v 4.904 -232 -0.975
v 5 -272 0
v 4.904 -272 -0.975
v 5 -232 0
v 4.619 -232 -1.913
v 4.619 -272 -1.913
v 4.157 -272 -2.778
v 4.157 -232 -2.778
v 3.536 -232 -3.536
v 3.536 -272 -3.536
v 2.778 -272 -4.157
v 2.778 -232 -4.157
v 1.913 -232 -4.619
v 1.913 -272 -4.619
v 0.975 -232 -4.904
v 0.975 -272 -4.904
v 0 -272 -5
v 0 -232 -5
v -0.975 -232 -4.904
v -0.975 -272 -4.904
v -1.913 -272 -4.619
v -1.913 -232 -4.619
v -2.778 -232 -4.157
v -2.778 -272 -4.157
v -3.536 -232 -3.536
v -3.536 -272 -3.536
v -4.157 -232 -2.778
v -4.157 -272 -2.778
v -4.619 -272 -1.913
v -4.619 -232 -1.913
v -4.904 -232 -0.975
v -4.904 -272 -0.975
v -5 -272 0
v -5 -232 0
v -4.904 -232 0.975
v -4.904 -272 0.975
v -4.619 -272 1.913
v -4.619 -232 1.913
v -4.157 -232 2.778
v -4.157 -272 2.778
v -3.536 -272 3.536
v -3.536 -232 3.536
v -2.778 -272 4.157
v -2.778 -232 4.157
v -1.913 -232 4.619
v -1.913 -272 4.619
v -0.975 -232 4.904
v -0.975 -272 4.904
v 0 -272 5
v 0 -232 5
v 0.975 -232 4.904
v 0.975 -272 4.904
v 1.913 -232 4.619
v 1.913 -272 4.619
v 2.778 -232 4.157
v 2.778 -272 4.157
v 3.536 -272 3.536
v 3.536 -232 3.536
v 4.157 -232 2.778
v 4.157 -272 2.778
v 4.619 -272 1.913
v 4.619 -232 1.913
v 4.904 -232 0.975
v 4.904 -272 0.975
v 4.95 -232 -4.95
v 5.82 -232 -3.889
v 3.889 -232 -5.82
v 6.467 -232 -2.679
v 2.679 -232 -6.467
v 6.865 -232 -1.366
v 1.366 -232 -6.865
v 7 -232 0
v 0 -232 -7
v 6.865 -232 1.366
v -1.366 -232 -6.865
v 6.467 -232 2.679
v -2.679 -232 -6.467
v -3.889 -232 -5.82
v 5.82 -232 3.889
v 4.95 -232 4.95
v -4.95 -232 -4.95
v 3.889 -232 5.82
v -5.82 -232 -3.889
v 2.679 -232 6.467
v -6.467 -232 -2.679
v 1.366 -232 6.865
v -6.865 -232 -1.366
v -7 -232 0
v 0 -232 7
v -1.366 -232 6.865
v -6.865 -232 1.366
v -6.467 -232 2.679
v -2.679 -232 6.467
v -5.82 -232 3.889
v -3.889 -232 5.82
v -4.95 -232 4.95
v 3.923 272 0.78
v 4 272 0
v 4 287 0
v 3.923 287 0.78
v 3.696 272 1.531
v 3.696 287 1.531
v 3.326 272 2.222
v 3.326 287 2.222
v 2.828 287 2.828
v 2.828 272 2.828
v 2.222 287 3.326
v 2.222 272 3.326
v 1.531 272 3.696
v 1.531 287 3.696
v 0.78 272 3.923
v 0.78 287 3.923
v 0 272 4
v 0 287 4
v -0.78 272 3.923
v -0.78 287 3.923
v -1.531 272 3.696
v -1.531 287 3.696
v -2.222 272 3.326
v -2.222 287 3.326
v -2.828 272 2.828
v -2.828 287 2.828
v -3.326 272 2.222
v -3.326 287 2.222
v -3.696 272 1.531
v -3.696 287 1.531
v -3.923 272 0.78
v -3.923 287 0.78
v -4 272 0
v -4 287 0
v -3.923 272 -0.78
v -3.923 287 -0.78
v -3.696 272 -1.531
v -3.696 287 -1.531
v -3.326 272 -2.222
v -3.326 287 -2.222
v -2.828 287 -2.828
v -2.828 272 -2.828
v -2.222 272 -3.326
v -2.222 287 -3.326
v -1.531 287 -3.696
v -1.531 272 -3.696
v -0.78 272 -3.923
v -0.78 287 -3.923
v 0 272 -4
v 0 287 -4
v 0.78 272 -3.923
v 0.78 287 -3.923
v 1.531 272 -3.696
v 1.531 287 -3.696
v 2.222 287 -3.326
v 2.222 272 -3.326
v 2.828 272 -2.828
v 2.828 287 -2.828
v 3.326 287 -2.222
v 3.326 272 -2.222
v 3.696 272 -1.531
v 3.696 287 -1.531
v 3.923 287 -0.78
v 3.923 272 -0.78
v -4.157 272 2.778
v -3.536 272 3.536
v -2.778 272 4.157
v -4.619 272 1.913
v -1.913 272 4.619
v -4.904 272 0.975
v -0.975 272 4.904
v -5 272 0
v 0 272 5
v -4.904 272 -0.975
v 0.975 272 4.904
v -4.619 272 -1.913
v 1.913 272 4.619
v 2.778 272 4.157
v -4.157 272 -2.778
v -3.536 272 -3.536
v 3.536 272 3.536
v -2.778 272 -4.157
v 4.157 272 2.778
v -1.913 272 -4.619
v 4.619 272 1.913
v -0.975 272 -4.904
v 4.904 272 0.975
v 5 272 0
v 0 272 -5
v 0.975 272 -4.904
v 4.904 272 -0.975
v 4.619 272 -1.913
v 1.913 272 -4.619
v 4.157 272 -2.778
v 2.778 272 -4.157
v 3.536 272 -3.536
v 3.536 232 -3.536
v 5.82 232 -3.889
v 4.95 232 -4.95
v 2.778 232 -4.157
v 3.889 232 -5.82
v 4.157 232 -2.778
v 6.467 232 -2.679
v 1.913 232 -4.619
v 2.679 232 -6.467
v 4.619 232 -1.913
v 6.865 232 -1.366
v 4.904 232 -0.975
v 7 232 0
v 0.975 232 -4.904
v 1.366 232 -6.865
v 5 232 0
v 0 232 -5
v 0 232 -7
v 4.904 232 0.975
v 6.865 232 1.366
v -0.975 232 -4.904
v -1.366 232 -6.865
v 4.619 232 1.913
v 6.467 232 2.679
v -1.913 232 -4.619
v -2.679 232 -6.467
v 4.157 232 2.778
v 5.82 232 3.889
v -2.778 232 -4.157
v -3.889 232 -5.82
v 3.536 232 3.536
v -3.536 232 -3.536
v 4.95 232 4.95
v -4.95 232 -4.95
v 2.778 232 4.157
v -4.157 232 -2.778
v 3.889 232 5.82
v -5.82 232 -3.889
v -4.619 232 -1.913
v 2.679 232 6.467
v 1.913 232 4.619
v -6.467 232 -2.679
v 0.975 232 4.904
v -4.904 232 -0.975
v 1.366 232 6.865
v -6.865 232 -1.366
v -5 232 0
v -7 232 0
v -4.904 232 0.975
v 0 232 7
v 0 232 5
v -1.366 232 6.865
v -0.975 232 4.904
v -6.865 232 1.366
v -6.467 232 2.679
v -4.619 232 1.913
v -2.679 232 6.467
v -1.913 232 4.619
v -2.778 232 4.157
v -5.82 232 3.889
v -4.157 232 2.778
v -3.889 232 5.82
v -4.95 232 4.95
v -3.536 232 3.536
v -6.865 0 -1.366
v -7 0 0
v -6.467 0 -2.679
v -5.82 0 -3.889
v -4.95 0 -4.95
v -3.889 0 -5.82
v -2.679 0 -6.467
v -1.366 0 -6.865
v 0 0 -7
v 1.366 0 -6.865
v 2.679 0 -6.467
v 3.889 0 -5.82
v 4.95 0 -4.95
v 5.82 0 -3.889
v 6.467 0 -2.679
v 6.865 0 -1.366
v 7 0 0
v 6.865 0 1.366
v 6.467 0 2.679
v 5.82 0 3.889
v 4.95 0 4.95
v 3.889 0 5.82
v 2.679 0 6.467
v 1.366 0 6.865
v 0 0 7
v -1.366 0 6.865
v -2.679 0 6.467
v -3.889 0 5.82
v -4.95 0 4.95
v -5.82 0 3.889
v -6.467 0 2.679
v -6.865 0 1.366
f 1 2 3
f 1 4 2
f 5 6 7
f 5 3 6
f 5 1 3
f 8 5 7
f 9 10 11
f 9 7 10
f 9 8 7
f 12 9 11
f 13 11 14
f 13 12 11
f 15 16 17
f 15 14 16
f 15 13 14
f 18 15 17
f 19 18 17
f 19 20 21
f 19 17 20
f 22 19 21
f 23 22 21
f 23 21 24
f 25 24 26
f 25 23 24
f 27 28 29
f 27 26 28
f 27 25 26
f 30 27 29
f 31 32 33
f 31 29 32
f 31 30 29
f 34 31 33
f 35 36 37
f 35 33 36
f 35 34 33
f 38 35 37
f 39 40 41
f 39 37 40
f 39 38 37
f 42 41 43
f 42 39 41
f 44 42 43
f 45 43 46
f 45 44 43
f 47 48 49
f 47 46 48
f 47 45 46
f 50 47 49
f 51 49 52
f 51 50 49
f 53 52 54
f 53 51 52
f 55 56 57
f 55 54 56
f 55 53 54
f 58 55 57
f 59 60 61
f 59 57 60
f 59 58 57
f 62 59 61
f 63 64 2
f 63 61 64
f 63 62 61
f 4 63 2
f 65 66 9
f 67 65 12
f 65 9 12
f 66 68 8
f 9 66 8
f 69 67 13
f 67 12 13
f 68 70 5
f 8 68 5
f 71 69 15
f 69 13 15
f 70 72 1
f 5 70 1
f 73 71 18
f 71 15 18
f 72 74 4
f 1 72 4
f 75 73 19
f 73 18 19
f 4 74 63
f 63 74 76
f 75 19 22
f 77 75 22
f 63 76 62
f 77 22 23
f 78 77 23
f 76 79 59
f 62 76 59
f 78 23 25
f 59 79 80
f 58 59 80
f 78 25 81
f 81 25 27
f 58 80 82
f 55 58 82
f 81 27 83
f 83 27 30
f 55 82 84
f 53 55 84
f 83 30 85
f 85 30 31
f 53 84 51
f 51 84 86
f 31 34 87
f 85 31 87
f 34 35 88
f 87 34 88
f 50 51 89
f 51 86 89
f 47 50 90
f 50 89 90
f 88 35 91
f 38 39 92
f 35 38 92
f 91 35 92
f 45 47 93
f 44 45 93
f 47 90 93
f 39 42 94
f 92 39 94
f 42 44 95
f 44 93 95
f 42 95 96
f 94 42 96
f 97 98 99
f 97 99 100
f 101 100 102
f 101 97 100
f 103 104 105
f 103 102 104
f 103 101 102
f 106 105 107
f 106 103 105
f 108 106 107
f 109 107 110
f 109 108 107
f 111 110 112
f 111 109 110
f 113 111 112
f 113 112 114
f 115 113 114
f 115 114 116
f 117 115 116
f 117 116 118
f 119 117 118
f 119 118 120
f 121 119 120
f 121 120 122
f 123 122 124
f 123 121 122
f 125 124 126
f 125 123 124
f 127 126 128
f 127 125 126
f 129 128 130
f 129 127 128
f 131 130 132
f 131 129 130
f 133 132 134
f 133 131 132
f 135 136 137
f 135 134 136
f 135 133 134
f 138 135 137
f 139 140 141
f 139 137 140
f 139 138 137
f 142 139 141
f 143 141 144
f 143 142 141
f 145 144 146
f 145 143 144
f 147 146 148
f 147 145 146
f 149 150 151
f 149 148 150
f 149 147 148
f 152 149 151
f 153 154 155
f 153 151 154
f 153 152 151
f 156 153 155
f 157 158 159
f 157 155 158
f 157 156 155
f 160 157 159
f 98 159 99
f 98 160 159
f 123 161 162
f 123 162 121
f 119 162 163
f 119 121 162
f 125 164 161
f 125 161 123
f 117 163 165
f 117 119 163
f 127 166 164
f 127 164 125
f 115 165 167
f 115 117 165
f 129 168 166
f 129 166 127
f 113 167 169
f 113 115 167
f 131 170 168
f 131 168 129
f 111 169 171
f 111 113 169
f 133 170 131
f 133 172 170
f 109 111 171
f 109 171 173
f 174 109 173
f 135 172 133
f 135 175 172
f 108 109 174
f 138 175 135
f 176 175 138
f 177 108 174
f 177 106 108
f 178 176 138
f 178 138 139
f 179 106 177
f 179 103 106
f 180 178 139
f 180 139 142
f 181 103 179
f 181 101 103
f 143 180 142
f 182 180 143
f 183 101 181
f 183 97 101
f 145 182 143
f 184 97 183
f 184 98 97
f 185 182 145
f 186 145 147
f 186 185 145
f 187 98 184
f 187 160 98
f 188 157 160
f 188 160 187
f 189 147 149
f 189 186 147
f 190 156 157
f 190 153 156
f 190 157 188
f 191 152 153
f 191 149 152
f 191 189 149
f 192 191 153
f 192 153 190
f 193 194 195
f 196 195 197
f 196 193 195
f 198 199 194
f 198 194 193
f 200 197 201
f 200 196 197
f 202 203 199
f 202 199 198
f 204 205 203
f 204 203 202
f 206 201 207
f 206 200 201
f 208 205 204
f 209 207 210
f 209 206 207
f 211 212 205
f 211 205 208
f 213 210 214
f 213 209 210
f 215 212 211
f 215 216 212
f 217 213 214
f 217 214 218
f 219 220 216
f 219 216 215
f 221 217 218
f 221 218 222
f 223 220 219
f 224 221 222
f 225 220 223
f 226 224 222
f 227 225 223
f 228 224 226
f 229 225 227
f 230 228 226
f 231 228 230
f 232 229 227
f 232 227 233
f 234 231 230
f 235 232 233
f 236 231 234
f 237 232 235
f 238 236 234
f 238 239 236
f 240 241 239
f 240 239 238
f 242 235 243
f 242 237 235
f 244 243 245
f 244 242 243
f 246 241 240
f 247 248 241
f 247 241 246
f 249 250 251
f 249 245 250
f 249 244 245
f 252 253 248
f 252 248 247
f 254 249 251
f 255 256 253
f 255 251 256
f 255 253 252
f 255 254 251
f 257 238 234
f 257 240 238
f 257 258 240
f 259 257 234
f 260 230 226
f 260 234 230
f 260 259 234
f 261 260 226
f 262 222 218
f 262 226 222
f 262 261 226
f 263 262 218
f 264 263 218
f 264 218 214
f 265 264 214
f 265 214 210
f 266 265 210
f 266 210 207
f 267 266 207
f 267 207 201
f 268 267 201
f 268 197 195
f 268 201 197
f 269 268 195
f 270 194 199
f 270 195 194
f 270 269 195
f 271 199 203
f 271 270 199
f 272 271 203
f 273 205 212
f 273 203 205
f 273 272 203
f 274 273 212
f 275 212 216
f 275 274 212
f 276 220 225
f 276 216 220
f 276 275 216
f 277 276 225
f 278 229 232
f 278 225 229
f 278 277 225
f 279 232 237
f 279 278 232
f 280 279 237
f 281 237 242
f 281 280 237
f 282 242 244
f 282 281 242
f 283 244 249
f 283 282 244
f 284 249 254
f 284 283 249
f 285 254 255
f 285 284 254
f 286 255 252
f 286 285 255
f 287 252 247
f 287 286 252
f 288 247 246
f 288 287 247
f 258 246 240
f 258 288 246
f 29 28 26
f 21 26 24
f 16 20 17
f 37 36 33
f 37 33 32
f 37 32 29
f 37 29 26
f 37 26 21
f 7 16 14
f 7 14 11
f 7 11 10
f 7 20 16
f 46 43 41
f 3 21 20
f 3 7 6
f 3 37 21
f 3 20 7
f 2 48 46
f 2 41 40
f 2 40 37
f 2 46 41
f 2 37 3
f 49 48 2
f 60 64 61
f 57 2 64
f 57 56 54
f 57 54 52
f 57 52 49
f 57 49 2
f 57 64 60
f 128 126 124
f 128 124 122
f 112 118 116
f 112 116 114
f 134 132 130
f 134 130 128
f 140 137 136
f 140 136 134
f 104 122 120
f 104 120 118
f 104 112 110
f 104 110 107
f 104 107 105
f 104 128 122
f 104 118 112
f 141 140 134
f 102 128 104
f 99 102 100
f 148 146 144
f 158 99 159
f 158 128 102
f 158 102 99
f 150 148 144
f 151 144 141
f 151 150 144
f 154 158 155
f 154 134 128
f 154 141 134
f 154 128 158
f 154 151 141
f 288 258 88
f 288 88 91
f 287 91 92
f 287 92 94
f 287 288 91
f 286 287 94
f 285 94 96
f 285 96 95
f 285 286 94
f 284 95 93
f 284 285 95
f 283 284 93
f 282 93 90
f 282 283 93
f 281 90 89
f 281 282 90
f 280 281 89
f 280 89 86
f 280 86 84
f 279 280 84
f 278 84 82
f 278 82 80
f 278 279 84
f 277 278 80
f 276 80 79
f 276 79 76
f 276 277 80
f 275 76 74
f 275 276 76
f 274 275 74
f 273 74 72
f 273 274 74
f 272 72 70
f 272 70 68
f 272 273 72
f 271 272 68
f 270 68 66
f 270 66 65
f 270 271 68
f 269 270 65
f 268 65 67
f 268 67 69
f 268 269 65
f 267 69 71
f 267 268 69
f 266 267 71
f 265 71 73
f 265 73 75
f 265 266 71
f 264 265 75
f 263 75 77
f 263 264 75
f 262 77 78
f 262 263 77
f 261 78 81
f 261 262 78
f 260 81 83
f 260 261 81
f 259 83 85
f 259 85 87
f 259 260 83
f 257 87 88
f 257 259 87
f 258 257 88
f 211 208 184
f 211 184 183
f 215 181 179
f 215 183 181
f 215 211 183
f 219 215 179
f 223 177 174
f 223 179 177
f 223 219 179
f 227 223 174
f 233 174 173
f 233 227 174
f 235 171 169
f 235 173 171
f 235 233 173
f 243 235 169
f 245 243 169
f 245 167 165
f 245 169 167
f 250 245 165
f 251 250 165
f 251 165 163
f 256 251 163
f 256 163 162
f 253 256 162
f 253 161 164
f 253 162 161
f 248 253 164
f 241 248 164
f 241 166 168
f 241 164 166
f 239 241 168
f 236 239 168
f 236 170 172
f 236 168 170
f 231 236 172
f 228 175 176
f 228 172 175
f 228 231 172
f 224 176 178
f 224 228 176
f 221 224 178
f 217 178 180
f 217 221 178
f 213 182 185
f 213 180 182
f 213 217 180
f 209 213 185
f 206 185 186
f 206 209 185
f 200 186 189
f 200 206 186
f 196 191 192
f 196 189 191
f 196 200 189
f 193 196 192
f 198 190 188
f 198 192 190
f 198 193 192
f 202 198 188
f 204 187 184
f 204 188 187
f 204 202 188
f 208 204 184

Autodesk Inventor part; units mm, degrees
ref_plane "YZ Plane" through (0, 0, 0) normal (1, 0, 0) x (0, 1, 0)
ref_plane "XZ Plane" through (0, 0, 0) normal (0, 1, 0) x (-1, 0, 0)
ref_plane "XY Plane" through (0, 0, 0) normal (0, 0, 1) x (1, 0, 0)
sketch "Sketch1" plane through (0, 0, 0) normal (0, 1, 0) x (-1, 0, 0)
  circle A0 centre (0, 0) radius 7
  dimension "d0" = 14
extrude "Extrusion1" add sketch "Sketch1" along normal mid plane 464
sketch "Sketch2" plane through (0, 232, 0) normal (0, 1, 0) x (1, 0, 0)
  circle A0 centre (0, 0) radius 5
  dimension "d3" = 10
extrude "Extrusion2" add sketch "Sketch2" along normal blind 40
sketch "Sketch3" plane through (0, 272, 0) normal (0, 1, 0) x (1, 0, 0)
  circle A0 centre (0, 0) radius 4
  dimension "d6" = 8
extrude "Extrusion3" add sketch "Sketch3" along normal blind 15
thread "Thread1" size "M9x1" class "6g" standard "ANSI Metric M Profile" length 17
sketch "Sketch4" plane through (0, -232, 0) normal (0, -1, 0) x (1, 0, 0)
  circle A0 centre (0, 0) radius 5 projected
  circle A1 centre (0, 0) radius 5
  dimension "d13" = 10
extrude "Extrusion4" add sketch "Sketch4" along normal blind 40
properties part number "Screw Replica"
